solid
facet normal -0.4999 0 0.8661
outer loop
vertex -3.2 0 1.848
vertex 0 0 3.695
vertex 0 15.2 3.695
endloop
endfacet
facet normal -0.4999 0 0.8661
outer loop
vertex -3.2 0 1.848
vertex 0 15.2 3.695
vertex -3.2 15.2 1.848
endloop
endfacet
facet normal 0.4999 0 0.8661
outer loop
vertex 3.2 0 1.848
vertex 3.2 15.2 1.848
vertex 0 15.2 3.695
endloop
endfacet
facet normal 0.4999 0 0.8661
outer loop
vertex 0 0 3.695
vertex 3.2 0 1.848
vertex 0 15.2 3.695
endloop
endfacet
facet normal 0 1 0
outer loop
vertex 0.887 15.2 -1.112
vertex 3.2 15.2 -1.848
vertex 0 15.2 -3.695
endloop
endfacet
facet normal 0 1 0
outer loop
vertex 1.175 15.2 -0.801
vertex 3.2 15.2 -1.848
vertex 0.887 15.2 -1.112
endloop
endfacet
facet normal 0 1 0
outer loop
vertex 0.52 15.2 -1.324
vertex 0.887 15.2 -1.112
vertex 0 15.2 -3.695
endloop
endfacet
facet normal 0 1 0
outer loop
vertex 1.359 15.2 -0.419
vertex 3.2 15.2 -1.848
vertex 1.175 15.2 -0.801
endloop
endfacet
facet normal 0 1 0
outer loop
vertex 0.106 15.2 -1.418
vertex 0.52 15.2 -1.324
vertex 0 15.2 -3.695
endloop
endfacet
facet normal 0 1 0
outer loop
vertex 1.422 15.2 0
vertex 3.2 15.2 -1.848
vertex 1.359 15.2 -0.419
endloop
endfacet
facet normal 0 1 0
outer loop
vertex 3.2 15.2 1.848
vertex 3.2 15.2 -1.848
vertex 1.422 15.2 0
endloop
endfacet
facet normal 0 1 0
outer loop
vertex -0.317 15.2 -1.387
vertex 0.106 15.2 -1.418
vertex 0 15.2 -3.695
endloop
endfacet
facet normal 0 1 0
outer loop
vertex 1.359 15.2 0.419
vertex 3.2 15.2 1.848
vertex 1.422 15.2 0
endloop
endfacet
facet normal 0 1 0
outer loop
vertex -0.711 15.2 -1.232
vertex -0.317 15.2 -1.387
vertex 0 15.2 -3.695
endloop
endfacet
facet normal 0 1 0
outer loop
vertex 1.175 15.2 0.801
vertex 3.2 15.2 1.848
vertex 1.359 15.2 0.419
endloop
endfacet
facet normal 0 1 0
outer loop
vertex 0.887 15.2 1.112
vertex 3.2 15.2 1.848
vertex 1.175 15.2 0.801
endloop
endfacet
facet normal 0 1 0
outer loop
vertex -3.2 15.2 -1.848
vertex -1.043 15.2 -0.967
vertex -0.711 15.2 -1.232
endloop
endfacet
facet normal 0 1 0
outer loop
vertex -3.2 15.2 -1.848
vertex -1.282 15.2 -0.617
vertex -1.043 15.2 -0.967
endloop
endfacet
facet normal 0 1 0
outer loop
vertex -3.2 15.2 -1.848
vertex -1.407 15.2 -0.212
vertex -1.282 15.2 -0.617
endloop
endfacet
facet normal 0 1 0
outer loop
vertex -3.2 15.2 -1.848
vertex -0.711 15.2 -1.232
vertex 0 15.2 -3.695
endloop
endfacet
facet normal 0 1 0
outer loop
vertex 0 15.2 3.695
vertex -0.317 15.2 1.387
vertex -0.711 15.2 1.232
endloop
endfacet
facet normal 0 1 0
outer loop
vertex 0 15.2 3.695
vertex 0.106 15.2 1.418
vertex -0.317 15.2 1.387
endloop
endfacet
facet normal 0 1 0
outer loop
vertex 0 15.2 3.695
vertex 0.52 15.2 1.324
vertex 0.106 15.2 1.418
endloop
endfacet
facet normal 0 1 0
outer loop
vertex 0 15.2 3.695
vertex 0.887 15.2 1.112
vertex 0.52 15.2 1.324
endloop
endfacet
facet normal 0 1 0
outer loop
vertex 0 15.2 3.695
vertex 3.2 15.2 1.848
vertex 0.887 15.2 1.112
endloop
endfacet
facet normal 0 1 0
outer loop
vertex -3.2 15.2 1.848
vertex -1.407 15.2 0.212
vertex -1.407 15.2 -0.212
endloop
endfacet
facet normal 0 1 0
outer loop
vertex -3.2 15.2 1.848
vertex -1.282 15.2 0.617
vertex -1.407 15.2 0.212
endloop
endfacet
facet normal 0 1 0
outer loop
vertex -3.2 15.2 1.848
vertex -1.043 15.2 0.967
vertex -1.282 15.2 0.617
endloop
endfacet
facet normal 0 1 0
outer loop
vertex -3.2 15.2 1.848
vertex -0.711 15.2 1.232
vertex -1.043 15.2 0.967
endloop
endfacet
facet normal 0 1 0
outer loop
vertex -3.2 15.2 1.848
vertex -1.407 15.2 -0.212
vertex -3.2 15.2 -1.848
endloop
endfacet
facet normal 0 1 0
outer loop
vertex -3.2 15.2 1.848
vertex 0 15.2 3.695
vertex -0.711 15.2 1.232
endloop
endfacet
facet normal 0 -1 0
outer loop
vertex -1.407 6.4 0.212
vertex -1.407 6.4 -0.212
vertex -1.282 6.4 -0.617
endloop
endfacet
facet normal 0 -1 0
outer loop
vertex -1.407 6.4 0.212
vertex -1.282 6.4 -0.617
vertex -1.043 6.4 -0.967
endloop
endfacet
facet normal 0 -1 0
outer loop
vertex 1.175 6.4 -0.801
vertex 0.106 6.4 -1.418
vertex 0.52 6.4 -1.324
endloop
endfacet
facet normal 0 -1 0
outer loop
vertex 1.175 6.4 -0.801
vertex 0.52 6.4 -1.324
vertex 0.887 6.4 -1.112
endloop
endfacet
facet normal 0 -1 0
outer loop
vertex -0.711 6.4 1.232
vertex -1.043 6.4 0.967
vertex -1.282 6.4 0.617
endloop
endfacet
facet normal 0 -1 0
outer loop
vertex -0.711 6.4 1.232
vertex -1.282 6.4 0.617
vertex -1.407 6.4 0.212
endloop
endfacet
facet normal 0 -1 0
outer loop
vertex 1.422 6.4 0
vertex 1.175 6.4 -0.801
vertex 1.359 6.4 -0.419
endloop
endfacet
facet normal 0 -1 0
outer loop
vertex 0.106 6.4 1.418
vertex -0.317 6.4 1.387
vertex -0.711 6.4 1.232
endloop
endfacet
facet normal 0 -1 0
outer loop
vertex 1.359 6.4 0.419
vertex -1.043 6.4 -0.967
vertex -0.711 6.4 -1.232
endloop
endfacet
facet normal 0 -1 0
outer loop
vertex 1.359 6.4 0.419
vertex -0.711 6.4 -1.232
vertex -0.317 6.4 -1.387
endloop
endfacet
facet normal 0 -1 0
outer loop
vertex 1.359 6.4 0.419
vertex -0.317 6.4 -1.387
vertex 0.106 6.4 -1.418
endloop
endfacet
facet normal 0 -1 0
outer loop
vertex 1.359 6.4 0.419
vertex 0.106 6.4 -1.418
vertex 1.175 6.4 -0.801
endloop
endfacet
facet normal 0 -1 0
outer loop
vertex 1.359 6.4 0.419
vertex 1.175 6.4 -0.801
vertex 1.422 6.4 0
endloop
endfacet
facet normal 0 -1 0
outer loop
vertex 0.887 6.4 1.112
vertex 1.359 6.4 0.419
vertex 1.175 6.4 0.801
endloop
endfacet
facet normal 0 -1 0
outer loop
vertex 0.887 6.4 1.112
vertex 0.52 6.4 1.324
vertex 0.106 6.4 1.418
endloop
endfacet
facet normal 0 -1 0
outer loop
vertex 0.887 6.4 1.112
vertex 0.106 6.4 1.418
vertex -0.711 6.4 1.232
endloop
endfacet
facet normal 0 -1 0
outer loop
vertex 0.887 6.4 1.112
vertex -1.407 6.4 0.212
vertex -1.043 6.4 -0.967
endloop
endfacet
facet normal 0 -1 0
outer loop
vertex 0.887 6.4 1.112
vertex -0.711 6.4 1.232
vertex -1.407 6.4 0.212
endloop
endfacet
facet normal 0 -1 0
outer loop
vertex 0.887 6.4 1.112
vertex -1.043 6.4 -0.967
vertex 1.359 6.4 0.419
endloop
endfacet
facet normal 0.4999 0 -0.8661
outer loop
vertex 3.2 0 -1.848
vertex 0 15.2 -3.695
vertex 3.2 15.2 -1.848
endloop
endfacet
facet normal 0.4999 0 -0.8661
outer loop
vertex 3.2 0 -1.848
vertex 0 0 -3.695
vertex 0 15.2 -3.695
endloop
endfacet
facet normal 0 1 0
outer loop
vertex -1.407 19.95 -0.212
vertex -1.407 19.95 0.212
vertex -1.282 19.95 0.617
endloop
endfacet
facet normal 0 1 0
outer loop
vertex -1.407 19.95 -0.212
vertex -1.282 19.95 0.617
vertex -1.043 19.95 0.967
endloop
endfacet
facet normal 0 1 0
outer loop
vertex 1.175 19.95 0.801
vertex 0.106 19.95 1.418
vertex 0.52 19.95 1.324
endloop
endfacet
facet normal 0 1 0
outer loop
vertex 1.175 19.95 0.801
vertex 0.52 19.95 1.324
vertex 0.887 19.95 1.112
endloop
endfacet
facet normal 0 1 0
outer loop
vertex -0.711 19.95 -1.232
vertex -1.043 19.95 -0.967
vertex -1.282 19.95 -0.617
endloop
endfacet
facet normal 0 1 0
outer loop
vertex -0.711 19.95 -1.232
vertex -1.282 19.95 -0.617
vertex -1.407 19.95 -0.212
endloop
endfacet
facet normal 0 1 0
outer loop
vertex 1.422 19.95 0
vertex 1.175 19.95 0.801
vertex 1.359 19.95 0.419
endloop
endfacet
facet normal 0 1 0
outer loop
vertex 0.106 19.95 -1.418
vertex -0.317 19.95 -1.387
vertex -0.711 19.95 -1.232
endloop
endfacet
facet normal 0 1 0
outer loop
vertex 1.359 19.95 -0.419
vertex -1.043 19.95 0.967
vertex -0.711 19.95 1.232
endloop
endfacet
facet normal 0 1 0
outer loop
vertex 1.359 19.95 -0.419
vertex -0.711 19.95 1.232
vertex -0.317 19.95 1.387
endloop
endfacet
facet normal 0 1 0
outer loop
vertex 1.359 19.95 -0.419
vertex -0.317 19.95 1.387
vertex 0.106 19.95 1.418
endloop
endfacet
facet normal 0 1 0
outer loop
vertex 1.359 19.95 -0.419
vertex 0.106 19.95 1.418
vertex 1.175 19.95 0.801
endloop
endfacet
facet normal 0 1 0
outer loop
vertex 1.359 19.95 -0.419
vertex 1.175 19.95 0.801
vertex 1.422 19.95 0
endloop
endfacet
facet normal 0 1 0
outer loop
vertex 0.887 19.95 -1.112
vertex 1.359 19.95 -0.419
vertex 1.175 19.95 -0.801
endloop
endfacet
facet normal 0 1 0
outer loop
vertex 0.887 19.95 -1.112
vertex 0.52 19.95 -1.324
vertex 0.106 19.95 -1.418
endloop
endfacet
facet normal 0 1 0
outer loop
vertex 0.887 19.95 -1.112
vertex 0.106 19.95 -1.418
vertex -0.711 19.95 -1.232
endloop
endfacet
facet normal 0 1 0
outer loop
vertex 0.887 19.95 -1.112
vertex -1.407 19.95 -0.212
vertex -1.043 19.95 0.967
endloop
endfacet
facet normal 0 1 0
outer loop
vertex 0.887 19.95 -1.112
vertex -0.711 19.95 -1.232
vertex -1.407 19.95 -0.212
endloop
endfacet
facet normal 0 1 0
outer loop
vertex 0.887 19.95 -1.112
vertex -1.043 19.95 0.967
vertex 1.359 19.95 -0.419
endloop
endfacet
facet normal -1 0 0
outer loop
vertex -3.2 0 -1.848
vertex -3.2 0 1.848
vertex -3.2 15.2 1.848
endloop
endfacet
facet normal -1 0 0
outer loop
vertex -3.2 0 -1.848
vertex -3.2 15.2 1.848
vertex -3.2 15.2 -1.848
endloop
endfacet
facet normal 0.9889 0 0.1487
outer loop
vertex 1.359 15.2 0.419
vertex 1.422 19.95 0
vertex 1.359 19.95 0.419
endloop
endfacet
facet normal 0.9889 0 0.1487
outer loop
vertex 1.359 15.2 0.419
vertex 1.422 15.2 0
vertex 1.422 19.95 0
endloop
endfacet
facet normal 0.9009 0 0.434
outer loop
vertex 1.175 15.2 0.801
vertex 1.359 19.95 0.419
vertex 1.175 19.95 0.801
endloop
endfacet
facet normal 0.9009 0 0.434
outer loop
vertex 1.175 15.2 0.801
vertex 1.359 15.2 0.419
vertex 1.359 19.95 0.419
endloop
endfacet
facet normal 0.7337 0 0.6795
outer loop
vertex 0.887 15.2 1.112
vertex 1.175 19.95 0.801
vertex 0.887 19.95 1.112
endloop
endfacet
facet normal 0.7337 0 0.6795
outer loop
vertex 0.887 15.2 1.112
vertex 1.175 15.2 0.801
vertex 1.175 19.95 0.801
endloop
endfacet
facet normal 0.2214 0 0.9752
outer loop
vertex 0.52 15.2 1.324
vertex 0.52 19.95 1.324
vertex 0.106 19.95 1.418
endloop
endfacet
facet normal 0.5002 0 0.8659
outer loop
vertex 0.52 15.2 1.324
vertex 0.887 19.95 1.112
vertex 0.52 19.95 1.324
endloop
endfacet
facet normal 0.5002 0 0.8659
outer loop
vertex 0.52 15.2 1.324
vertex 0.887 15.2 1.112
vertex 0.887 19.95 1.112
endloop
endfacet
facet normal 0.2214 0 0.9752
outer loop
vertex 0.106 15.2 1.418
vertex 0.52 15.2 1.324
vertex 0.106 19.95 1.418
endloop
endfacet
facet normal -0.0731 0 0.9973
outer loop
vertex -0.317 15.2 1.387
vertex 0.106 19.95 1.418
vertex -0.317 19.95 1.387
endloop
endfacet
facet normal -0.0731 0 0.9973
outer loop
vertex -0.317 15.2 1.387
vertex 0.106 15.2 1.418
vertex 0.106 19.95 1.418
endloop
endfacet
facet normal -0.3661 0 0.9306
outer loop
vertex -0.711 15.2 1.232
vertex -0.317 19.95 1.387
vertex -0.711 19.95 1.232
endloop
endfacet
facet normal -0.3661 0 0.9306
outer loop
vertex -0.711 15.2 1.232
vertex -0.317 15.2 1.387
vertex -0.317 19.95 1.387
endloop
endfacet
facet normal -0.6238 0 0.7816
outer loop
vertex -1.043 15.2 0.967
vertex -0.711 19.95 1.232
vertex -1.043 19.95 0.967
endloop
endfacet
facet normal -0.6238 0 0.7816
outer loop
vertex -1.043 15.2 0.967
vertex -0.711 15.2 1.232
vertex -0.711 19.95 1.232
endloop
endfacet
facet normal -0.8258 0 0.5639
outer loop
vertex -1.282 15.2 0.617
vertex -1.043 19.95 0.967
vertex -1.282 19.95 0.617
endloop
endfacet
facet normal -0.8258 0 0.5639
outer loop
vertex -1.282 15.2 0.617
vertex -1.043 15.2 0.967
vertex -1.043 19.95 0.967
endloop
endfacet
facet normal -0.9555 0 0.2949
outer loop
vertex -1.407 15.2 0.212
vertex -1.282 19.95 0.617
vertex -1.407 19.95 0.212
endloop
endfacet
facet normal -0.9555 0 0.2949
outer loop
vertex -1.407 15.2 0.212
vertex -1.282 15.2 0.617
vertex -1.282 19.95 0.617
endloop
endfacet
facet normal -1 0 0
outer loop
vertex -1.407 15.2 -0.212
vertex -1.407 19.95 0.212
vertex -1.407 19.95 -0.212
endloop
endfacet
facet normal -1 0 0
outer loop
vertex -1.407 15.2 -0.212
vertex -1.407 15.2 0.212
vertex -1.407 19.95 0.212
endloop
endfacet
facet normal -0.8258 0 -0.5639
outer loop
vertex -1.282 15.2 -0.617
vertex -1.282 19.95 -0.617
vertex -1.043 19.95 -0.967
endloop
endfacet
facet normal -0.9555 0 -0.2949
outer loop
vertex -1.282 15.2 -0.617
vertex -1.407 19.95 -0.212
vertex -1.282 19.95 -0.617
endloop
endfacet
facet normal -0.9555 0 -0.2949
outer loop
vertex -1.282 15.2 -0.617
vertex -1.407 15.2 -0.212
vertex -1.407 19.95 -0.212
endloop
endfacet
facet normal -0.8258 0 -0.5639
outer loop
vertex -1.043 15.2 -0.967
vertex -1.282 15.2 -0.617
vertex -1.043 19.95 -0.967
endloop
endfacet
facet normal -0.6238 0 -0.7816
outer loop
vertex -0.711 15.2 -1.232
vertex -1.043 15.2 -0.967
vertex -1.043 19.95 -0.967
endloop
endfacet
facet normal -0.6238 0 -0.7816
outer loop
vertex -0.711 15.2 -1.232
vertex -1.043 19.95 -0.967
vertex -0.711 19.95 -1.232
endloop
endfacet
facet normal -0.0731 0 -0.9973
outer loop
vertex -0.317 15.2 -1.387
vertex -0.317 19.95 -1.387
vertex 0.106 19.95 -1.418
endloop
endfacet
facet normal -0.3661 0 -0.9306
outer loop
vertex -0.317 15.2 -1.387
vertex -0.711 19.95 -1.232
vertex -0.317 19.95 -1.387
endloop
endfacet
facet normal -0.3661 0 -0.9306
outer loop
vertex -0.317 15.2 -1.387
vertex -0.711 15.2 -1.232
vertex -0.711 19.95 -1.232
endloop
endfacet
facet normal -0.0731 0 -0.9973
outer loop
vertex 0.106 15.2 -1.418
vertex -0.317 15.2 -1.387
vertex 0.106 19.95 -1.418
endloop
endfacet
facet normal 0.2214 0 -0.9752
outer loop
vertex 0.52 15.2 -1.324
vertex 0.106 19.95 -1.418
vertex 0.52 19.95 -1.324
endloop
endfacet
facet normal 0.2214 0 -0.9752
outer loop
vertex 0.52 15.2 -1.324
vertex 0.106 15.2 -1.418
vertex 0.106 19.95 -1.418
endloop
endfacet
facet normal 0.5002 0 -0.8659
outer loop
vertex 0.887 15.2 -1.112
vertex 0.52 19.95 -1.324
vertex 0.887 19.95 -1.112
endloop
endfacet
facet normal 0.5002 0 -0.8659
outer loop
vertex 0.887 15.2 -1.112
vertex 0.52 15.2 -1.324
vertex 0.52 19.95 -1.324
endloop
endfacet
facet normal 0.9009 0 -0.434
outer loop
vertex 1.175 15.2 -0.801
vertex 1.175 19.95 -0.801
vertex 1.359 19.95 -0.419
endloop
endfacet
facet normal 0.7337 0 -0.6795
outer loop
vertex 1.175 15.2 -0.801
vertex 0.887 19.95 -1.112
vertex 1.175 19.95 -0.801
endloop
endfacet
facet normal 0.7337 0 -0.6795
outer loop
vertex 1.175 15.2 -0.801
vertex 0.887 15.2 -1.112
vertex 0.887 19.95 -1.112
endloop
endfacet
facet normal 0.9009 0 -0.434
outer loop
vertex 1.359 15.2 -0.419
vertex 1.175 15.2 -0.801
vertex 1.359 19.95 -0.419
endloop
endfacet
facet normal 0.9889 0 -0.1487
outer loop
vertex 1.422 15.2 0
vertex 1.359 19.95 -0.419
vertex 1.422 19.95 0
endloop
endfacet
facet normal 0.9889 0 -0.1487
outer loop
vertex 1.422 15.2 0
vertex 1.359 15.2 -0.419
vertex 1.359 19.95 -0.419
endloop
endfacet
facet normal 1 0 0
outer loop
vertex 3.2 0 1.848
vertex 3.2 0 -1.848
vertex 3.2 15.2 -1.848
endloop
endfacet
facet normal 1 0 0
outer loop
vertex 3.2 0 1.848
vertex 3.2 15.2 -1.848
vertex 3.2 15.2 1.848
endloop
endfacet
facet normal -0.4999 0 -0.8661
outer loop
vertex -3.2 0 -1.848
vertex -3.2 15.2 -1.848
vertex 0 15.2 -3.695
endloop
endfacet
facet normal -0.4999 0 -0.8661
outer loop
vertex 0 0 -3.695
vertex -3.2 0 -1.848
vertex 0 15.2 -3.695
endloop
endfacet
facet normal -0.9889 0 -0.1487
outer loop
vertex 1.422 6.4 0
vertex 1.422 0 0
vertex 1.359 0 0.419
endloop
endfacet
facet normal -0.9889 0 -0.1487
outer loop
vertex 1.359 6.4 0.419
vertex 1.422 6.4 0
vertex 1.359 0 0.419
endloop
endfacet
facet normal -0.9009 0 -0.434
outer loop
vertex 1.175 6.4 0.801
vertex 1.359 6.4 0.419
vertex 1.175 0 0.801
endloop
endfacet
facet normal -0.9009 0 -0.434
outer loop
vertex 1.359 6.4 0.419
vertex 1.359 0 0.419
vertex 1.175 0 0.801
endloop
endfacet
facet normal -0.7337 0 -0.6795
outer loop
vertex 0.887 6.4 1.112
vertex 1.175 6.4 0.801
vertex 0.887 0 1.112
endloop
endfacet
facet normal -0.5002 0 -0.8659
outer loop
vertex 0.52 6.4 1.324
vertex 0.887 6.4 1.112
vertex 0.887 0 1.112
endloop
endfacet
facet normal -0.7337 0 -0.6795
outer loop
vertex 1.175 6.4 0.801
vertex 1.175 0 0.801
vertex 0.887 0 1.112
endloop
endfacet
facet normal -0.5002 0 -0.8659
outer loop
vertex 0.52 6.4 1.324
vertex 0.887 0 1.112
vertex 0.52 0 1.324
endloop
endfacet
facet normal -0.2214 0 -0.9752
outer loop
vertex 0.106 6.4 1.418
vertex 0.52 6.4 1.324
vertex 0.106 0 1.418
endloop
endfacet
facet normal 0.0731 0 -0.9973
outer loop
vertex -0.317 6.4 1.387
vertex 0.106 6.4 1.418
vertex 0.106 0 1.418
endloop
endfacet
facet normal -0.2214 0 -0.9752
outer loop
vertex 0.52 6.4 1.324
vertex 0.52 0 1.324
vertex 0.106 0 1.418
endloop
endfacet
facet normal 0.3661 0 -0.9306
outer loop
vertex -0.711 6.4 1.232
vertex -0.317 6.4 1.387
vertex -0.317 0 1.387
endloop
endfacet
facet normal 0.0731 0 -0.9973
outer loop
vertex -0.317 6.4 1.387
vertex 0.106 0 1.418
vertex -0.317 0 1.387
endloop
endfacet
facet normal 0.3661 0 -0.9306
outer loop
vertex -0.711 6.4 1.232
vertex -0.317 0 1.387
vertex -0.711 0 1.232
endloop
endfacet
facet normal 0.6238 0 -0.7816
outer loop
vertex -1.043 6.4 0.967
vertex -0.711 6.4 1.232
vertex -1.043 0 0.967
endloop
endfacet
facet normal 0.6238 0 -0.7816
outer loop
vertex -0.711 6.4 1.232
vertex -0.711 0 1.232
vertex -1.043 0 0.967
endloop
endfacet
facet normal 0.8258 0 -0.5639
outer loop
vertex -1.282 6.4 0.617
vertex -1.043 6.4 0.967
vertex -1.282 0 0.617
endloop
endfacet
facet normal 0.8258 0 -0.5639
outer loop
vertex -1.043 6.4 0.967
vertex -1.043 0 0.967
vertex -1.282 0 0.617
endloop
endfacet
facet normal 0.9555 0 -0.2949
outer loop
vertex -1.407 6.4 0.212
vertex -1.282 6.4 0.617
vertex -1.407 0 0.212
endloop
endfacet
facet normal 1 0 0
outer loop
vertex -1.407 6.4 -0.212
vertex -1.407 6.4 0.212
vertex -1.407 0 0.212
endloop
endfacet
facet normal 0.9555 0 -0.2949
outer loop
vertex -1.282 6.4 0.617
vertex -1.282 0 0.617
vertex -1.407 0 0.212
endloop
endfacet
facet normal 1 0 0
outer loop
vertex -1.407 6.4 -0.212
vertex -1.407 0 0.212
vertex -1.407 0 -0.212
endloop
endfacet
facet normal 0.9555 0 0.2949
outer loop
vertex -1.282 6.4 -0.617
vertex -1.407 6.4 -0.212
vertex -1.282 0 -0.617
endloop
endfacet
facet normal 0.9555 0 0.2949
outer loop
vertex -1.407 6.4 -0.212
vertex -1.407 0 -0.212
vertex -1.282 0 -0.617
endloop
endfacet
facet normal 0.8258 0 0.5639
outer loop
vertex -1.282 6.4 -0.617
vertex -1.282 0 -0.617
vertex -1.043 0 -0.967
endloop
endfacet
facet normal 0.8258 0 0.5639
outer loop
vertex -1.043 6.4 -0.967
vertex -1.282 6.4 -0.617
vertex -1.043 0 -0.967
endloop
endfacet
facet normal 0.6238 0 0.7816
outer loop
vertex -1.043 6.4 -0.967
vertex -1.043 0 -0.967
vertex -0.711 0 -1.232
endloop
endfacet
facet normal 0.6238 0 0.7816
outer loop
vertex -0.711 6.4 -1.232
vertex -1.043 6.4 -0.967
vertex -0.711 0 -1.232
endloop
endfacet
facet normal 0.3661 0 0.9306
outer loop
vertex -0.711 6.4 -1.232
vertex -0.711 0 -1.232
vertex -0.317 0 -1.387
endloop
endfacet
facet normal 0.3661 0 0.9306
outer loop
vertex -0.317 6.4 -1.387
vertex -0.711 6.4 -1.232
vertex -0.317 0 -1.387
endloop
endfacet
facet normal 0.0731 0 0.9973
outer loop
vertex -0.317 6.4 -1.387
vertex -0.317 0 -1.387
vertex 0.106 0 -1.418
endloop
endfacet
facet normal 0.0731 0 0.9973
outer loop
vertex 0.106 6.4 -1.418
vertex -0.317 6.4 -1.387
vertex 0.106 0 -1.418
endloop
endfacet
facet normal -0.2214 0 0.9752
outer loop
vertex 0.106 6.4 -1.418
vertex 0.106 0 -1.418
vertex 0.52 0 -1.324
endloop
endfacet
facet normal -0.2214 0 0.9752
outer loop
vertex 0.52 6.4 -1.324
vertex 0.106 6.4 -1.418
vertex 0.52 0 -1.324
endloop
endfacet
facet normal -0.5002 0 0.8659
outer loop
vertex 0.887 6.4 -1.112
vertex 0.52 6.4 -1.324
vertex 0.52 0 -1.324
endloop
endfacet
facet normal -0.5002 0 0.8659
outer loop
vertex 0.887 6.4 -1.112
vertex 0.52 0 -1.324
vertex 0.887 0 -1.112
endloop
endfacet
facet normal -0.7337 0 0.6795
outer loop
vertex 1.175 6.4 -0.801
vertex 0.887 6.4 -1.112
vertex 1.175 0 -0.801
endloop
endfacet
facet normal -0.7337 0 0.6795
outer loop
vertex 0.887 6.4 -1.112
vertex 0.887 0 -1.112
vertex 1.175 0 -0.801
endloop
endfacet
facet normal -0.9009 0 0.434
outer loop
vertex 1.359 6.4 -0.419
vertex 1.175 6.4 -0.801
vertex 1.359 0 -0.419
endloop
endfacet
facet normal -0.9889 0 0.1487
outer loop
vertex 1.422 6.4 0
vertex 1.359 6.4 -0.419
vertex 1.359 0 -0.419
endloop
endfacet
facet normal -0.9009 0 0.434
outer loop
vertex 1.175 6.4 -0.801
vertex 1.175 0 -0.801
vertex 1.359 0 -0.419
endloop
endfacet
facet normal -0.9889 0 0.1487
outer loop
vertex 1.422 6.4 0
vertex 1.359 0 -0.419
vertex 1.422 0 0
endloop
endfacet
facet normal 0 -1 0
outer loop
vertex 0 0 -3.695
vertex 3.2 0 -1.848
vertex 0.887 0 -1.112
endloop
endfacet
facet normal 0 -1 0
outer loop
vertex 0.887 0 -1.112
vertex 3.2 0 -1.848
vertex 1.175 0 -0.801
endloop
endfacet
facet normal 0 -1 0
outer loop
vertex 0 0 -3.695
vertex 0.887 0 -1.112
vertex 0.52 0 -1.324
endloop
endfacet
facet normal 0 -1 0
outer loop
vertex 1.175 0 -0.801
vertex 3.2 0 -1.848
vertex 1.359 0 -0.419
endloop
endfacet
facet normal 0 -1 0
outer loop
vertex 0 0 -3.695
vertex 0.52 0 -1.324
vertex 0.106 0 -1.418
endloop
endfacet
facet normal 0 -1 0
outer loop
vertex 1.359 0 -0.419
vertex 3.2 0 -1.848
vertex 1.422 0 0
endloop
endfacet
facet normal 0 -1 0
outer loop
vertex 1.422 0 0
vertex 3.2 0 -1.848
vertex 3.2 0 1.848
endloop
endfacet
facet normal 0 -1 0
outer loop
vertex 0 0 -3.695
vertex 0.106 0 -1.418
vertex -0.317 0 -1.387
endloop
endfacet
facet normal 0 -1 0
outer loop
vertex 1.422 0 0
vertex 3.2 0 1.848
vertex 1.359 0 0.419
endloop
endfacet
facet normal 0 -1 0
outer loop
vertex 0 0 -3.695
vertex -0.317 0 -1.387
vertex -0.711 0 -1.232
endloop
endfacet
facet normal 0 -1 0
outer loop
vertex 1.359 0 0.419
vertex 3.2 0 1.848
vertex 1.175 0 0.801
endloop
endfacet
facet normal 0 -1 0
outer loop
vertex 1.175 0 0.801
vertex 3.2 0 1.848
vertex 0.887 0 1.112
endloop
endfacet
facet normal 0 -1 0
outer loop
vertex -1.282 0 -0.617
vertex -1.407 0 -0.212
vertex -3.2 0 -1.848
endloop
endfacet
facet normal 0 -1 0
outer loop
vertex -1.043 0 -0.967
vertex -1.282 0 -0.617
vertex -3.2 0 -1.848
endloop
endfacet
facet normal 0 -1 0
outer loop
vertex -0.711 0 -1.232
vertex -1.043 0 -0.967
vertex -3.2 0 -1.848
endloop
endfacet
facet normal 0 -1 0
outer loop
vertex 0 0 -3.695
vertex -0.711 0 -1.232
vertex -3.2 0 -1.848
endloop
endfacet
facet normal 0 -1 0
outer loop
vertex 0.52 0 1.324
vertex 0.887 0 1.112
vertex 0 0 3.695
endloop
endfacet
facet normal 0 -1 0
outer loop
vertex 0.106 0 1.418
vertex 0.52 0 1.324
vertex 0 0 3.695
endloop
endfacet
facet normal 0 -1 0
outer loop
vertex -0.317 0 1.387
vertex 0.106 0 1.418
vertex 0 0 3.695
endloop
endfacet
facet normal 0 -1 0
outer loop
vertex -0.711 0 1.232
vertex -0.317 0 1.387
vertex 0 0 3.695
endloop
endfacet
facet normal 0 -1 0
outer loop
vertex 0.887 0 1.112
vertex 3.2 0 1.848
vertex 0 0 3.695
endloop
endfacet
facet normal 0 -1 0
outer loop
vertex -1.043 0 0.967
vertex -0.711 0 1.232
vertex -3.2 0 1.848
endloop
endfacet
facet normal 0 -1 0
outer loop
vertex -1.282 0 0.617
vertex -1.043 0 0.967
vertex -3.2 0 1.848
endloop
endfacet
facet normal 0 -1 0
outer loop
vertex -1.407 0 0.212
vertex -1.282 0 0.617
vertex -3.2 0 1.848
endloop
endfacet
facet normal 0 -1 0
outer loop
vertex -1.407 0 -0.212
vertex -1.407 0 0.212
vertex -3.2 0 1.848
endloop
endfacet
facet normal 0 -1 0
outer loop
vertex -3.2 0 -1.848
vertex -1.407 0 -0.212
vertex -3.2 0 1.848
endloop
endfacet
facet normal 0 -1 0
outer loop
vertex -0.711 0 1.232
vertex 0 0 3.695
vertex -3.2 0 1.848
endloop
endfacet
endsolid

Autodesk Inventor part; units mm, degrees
ref_plane "YZ Plane" through (0, 0, 0) normal (1, 0, 0) x (0, 1, 0)
ref_plane "XZ Plane" through (0, 0, 0) normal (0, 1, 0) x (-1, 0, 0)
ref_plane "XY Plane" through (0, 0, 0) normal (0, 0, 1) x (1, 0, 0)
sketch "Sketch1" plane through (0, 0, 0) normal (0, 1, 0) x (-1, 0, 0)
  line L0 (3.2, 1.8475) -> (3.2, -1.8475)
  line L1 (3.2, -1.8475) -> (0, -3.695)
  line L2 (0, -3.695) -> (-3.2, -1.8475)
  line L3 (-3.2, -1.8475) -> (-3.2, 1.8475)
  line L4 (-3.2, 1.8475) -> (0, 3.695)
  line L5 (0, 3.695) -> (3.2, 1.8475)
  point P0 (0, 0)
  point P1 (3.2, 0)
  point P2 (-3.2, 0)
  dimension "d0" = 6.4
  dimension "d1" = 120
  dimension "d2" = 6.4
extrude "Extrusion1" add sketch "Sketch1" along normal blind 15.2
sketch "Sketch3" plane through (0, 0, 0) normal (0, -1, 0) x (1, 0, 0)
  circle A0 centre (0, 0) radius 1.4224
  dimension "d8" = 2.8448
extrude "Extrusion3" cut sketch "Sketch3" against normal blind 6.4
sketch "Sketch4" plane through (0, 15.2, 0) normal (0, 1, 0) x (1, 0, 0)
  circle A0 centre (0, 0) radius 1.4224 projected
extrude "Extrusion4" add sketch "Sketch4" along normal blind 4.75
properties part number "pc104standoff" material "Stainless Steel"
